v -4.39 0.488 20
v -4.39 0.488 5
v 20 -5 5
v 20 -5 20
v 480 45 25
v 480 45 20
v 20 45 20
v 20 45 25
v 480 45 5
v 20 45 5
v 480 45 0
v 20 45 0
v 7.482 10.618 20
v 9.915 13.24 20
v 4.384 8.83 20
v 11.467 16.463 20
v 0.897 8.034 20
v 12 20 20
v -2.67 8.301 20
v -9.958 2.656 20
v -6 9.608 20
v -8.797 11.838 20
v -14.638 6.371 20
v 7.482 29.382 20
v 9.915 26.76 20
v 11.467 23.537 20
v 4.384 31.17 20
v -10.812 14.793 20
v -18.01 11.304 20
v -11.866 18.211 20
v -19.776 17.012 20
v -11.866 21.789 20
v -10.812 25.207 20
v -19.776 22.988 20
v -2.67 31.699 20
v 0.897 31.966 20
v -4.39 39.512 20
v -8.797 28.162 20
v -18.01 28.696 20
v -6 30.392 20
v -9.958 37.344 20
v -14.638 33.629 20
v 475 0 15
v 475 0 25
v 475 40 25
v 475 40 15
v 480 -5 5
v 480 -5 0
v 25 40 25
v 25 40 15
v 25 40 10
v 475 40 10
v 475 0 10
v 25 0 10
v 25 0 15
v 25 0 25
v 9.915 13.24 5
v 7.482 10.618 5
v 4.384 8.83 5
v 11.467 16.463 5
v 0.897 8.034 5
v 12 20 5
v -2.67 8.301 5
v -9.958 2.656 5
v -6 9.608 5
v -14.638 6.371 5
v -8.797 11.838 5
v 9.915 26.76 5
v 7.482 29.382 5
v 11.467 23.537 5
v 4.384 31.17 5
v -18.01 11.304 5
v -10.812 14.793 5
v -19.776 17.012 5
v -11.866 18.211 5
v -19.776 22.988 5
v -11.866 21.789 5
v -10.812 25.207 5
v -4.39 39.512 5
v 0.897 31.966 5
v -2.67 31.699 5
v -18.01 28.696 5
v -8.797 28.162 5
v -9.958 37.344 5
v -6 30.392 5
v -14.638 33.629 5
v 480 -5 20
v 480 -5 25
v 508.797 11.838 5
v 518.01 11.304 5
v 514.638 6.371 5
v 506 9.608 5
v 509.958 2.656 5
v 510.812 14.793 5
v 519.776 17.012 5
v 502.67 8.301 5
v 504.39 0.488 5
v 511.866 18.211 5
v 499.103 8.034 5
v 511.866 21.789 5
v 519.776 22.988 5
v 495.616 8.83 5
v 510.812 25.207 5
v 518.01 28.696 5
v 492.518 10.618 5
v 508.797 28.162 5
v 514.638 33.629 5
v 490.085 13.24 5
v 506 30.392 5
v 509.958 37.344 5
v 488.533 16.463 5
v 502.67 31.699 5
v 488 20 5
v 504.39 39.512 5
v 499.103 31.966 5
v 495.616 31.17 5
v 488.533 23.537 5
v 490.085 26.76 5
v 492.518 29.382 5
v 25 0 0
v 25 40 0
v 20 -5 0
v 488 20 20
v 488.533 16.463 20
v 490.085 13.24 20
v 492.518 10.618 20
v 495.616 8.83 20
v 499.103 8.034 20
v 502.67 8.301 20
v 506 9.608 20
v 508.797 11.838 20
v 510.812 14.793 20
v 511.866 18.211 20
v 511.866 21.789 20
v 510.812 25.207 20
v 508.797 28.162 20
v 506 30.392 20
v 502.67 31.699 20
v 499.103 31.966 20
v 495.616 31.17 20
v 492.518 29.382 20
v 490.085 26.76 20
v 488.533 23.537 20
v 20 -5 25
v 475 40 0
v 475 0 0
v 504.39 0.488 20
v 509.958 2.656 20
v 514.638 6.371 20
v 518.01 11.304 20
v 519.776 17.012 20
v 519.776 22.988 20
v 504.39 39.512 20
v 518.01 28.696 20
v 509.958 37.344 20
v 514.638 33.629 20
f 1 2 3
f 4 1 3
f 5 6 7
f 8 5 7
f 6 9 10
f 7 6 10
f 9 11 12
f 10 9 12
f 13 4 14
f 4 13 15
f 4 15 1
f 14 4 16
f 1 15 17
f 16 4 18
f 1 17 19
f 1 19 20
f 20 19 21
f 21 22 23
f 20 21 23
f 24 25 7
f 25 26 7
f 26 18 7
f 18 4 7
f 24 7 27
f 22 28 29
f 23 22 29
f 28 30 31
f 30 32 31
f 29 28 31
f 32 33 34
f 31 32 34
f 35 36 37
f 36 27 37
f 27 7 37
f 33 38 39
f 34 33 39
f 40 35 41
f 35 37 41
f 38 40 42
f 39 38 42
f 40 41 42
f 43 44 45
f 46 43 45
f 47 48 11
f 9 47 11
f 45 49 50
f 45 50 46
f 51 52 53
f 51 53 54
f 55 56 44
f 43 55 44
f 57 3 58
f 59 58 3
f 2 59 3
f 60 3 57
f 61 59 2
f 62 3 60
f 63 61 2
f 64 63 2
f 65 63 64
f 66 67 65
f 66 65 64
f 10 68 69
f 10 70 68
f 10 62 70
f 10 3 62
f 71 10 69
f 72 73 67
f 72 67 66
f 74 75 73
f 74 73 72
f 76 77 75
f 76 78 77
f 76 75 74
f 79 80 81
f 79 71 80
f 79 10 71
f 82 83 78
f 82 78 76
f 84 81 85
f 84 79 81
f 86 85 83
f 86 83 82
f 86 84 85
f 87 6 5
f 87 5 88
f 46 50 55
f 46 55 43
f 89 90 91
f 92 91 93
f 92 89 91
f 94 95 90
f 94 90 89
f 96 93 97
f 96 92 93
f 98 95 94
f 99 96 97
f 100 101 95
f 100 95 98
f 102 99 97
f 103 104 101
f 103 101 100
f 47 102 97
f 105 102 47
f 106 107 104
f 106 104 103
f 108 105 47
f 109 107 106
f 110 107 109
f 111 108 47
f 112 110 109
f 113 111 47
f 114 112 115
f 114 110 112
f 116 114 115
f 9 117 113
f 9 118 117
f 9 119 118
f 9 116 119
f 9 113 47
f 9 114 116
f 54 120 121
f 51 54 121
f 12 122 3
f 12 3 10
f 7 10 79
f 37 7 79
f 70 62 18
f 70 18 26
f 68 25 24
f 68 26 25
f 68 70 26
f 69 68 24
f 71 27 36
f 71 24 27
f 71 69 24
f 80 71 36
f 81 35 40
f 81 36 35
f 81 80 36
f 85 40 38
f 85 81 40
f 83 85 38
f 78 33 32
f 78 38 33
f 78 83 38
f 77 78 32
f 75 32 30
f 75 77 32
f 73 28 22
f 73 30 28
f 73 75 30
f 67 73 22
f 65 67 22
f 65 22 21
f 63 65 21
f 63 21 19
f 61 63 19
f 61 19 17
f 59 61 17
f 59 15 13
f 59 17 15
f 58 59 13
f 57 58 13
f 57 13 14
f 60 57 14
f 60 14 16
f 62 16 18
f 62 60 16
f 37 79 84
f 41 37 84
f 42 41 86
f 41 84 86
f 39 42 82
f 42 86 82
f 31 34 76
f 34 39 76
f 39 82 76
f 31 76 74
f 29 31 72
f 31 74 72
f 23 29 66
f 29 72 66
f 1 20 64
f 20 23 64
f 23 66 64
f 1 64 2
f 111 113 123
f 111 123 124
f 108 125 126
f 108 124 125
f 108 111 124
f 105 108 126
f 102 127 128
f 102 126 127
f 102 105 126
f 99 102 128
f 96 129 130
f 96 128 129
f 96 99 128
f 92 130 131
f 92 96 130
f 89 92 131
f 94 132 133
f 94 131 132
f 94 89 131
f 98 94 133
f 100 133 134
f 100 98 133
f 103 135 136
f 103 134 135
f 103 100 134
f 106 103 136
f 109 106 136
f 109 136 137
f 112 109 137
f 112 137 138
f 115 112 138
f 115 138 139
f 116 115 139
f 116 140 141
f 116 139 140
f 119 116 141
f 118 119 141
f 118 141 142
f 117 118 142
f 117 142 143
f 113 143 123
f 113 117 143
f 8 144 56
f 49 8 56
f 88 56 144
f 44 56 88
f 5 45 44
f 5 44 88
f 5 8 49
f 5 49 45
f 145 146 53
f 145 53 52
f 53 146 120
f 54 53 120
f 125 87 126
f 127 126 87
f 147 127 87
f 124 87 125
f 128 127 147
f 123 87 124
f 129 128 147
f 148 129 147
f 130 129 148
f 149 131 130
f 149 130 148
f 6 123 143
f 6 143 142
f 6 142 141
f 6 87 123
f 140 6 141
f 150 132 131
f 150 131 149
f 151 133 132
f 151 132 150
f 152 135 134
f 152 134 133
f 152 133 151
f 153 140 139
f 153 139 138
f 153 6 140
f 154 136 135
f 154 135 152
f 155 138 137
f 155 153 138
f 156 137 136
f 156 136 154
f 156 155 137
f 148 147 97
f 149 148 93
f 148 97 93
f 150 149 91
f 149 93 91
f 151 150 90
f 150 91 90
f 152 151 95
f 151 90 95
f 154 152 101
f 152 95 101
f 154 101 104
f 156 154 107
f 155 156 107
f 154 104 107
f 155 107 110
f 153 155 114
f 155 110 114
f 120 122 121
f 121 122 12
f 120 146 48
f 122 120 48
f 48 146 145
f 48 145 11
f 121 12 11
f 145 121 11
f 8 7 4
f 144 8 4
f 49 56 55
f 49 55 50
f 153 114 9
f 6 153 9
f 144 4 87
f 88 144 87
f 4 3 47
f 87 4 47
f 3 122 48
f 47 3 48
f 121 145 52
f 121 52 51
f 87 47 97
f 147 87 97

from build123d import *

# Parameters (mm, degrees)
SKETCH_1_R          = 12
EXTRUDE_1_DEPTH     = 25
CUT_EXTRUDE_START   = -5
CUT_EXTRUDE_1_DEPTH = 5
SKETCH_4_W          = 52.563829399
SKETCH_4_H          = 76.236989851
SKETCH_4_W_2        = 57.767152805
SKETCH_4_H_2        = 93.721065463
CUT_EXTRUDE_5_DEPTH = 5
SKETCH_5_W          = 450
SKETCH_5_H          = 40
CUT_EXTRUDE_6_DEPTH = 10
SKETCH_7_W          = 450
SKETCH_7_H          = 40
CUT_EXTRUDE_7_DEPTH = 10


with BuildPart() as part:
    # 草图1 → 凸台-拉伸1 (new body)
    with BuildSketch(Plane.XY):
        with BuildLine():
            Line((20.000001136, 44.999994952), (-4.390239864, 39.512196031))
            ThreePointArc((-4.390239864, 39.512196031), (-20, 20), (-4.390239864, 0.487803969))
            Line((-4.390239864, 0.487803969), (20.000001136, -4.999994952))
            Line((20.000001136, -4.999994952), (479.999998864, -4.999994952))
            Line((479.999998864, -4.999994952), (504.390239864, 0.487803969))
            ThreePointArc((504.390239864, 0.487803969), (520, 20), (504.390239864, 39.512196031))
            Line((504.390239864, 39.512196031), (479.999998864, 44.999994952))
            Line((479.999998864, 44.999994952), (20.000001136, 44.999994952))
        make_face()
        with Locations((0, 20)):
            Circle(SKETCH_1_R, mode=Mode.SUBTRACT)
        with Locations(Location((500, 20, 0), (0, 0, 180))):
            Circle(SKETCH_1_R, mode=Mode.SUBTRACT)
    extrude(amount=EXTRUDE_1_DEPTH)

    # 草图2 → 切除-拉伸1 (cut)
    with BuildSketch(Plane.XY.offset(25).offset(CUT_EXTRUDE_START)):
        with BuildLine():
            Line((-4.390239864, 39.512196031), (20.000001136, 44.999994952))
            Line((20.000001136, 44.999994952), (20.000001136, -4.999994952))
            Line((20.000001136, -4.999994952), (-4.390239864, 0.487803969))
            ThreePointArc((-4.390239864, 0.487803969), (-20, 20), (-4.390239864, 39.512196031))
        make_face()
        with BuildLine():
            Line((504.390239864, 39.512196031), (479.999998864, 44.999994952))
            Line((479.999998864, 44.999994952), (479.999998864, -4.999994952))
            Line((479.999998864, -4.999994952), (504.390239864, 0.487803969))
            ThreePointArc((504.390239864, 0.487803969), (520, 20), (504.390239864, 39.512196031))
        make_face()
    extrude(amount=CUT_EXTRUDE_1_DEPTH, mode=Mode.SUBTRACT)

    # 草图4 → 切除-拉伸5 (cut)
    with BuildSketch(Plane(origin=(0, 0, 0), x_dir=(-1, 0, 0), z_dir=(0, 0, -1))):
        with Locations((-506.281913563, 33.118499974)):
            Rectangle(SKETCH_4_W, SKETCH_4_H)
        with Locations((8.883575266, 41.86053778)):
            Rectangle(SKETCH_4_W_2, SKETCH_4_H_2)
    extrude(amount=-CUT_EXTRUDE_5_DEPTH, mode=Mode.SUBTRACT)

    # 草图5 → 切除-拉伸6 (cut)
    with BuildSketch(Plane(origin=(0, 0, 0), x_dir=(-1, 0, 0), z_dir=(0, 0, -1))):
        with Locations((-250.000001136, 19.999994952)):
            Rectangle(SKETCH_5_W, SKETCH_5_H)
    extrude(amount=-CUT_EXTRUDE_6_DEPTH, mode=Mode.SUBTRACT)

    # 草图7 → 切除-拉伸7 (cut)
    with BuildSketch(Plane.XY.offset(25)):
        with Locations((250.000001136, 20.000005048)):
            Rectangle(SKETCH_7_W, SKETCH_7_H)
    extrude(amount=-CUT_EXTRUDE_7_DEPTH, mode=Mode.SUBTRACT)


solid = part.part
